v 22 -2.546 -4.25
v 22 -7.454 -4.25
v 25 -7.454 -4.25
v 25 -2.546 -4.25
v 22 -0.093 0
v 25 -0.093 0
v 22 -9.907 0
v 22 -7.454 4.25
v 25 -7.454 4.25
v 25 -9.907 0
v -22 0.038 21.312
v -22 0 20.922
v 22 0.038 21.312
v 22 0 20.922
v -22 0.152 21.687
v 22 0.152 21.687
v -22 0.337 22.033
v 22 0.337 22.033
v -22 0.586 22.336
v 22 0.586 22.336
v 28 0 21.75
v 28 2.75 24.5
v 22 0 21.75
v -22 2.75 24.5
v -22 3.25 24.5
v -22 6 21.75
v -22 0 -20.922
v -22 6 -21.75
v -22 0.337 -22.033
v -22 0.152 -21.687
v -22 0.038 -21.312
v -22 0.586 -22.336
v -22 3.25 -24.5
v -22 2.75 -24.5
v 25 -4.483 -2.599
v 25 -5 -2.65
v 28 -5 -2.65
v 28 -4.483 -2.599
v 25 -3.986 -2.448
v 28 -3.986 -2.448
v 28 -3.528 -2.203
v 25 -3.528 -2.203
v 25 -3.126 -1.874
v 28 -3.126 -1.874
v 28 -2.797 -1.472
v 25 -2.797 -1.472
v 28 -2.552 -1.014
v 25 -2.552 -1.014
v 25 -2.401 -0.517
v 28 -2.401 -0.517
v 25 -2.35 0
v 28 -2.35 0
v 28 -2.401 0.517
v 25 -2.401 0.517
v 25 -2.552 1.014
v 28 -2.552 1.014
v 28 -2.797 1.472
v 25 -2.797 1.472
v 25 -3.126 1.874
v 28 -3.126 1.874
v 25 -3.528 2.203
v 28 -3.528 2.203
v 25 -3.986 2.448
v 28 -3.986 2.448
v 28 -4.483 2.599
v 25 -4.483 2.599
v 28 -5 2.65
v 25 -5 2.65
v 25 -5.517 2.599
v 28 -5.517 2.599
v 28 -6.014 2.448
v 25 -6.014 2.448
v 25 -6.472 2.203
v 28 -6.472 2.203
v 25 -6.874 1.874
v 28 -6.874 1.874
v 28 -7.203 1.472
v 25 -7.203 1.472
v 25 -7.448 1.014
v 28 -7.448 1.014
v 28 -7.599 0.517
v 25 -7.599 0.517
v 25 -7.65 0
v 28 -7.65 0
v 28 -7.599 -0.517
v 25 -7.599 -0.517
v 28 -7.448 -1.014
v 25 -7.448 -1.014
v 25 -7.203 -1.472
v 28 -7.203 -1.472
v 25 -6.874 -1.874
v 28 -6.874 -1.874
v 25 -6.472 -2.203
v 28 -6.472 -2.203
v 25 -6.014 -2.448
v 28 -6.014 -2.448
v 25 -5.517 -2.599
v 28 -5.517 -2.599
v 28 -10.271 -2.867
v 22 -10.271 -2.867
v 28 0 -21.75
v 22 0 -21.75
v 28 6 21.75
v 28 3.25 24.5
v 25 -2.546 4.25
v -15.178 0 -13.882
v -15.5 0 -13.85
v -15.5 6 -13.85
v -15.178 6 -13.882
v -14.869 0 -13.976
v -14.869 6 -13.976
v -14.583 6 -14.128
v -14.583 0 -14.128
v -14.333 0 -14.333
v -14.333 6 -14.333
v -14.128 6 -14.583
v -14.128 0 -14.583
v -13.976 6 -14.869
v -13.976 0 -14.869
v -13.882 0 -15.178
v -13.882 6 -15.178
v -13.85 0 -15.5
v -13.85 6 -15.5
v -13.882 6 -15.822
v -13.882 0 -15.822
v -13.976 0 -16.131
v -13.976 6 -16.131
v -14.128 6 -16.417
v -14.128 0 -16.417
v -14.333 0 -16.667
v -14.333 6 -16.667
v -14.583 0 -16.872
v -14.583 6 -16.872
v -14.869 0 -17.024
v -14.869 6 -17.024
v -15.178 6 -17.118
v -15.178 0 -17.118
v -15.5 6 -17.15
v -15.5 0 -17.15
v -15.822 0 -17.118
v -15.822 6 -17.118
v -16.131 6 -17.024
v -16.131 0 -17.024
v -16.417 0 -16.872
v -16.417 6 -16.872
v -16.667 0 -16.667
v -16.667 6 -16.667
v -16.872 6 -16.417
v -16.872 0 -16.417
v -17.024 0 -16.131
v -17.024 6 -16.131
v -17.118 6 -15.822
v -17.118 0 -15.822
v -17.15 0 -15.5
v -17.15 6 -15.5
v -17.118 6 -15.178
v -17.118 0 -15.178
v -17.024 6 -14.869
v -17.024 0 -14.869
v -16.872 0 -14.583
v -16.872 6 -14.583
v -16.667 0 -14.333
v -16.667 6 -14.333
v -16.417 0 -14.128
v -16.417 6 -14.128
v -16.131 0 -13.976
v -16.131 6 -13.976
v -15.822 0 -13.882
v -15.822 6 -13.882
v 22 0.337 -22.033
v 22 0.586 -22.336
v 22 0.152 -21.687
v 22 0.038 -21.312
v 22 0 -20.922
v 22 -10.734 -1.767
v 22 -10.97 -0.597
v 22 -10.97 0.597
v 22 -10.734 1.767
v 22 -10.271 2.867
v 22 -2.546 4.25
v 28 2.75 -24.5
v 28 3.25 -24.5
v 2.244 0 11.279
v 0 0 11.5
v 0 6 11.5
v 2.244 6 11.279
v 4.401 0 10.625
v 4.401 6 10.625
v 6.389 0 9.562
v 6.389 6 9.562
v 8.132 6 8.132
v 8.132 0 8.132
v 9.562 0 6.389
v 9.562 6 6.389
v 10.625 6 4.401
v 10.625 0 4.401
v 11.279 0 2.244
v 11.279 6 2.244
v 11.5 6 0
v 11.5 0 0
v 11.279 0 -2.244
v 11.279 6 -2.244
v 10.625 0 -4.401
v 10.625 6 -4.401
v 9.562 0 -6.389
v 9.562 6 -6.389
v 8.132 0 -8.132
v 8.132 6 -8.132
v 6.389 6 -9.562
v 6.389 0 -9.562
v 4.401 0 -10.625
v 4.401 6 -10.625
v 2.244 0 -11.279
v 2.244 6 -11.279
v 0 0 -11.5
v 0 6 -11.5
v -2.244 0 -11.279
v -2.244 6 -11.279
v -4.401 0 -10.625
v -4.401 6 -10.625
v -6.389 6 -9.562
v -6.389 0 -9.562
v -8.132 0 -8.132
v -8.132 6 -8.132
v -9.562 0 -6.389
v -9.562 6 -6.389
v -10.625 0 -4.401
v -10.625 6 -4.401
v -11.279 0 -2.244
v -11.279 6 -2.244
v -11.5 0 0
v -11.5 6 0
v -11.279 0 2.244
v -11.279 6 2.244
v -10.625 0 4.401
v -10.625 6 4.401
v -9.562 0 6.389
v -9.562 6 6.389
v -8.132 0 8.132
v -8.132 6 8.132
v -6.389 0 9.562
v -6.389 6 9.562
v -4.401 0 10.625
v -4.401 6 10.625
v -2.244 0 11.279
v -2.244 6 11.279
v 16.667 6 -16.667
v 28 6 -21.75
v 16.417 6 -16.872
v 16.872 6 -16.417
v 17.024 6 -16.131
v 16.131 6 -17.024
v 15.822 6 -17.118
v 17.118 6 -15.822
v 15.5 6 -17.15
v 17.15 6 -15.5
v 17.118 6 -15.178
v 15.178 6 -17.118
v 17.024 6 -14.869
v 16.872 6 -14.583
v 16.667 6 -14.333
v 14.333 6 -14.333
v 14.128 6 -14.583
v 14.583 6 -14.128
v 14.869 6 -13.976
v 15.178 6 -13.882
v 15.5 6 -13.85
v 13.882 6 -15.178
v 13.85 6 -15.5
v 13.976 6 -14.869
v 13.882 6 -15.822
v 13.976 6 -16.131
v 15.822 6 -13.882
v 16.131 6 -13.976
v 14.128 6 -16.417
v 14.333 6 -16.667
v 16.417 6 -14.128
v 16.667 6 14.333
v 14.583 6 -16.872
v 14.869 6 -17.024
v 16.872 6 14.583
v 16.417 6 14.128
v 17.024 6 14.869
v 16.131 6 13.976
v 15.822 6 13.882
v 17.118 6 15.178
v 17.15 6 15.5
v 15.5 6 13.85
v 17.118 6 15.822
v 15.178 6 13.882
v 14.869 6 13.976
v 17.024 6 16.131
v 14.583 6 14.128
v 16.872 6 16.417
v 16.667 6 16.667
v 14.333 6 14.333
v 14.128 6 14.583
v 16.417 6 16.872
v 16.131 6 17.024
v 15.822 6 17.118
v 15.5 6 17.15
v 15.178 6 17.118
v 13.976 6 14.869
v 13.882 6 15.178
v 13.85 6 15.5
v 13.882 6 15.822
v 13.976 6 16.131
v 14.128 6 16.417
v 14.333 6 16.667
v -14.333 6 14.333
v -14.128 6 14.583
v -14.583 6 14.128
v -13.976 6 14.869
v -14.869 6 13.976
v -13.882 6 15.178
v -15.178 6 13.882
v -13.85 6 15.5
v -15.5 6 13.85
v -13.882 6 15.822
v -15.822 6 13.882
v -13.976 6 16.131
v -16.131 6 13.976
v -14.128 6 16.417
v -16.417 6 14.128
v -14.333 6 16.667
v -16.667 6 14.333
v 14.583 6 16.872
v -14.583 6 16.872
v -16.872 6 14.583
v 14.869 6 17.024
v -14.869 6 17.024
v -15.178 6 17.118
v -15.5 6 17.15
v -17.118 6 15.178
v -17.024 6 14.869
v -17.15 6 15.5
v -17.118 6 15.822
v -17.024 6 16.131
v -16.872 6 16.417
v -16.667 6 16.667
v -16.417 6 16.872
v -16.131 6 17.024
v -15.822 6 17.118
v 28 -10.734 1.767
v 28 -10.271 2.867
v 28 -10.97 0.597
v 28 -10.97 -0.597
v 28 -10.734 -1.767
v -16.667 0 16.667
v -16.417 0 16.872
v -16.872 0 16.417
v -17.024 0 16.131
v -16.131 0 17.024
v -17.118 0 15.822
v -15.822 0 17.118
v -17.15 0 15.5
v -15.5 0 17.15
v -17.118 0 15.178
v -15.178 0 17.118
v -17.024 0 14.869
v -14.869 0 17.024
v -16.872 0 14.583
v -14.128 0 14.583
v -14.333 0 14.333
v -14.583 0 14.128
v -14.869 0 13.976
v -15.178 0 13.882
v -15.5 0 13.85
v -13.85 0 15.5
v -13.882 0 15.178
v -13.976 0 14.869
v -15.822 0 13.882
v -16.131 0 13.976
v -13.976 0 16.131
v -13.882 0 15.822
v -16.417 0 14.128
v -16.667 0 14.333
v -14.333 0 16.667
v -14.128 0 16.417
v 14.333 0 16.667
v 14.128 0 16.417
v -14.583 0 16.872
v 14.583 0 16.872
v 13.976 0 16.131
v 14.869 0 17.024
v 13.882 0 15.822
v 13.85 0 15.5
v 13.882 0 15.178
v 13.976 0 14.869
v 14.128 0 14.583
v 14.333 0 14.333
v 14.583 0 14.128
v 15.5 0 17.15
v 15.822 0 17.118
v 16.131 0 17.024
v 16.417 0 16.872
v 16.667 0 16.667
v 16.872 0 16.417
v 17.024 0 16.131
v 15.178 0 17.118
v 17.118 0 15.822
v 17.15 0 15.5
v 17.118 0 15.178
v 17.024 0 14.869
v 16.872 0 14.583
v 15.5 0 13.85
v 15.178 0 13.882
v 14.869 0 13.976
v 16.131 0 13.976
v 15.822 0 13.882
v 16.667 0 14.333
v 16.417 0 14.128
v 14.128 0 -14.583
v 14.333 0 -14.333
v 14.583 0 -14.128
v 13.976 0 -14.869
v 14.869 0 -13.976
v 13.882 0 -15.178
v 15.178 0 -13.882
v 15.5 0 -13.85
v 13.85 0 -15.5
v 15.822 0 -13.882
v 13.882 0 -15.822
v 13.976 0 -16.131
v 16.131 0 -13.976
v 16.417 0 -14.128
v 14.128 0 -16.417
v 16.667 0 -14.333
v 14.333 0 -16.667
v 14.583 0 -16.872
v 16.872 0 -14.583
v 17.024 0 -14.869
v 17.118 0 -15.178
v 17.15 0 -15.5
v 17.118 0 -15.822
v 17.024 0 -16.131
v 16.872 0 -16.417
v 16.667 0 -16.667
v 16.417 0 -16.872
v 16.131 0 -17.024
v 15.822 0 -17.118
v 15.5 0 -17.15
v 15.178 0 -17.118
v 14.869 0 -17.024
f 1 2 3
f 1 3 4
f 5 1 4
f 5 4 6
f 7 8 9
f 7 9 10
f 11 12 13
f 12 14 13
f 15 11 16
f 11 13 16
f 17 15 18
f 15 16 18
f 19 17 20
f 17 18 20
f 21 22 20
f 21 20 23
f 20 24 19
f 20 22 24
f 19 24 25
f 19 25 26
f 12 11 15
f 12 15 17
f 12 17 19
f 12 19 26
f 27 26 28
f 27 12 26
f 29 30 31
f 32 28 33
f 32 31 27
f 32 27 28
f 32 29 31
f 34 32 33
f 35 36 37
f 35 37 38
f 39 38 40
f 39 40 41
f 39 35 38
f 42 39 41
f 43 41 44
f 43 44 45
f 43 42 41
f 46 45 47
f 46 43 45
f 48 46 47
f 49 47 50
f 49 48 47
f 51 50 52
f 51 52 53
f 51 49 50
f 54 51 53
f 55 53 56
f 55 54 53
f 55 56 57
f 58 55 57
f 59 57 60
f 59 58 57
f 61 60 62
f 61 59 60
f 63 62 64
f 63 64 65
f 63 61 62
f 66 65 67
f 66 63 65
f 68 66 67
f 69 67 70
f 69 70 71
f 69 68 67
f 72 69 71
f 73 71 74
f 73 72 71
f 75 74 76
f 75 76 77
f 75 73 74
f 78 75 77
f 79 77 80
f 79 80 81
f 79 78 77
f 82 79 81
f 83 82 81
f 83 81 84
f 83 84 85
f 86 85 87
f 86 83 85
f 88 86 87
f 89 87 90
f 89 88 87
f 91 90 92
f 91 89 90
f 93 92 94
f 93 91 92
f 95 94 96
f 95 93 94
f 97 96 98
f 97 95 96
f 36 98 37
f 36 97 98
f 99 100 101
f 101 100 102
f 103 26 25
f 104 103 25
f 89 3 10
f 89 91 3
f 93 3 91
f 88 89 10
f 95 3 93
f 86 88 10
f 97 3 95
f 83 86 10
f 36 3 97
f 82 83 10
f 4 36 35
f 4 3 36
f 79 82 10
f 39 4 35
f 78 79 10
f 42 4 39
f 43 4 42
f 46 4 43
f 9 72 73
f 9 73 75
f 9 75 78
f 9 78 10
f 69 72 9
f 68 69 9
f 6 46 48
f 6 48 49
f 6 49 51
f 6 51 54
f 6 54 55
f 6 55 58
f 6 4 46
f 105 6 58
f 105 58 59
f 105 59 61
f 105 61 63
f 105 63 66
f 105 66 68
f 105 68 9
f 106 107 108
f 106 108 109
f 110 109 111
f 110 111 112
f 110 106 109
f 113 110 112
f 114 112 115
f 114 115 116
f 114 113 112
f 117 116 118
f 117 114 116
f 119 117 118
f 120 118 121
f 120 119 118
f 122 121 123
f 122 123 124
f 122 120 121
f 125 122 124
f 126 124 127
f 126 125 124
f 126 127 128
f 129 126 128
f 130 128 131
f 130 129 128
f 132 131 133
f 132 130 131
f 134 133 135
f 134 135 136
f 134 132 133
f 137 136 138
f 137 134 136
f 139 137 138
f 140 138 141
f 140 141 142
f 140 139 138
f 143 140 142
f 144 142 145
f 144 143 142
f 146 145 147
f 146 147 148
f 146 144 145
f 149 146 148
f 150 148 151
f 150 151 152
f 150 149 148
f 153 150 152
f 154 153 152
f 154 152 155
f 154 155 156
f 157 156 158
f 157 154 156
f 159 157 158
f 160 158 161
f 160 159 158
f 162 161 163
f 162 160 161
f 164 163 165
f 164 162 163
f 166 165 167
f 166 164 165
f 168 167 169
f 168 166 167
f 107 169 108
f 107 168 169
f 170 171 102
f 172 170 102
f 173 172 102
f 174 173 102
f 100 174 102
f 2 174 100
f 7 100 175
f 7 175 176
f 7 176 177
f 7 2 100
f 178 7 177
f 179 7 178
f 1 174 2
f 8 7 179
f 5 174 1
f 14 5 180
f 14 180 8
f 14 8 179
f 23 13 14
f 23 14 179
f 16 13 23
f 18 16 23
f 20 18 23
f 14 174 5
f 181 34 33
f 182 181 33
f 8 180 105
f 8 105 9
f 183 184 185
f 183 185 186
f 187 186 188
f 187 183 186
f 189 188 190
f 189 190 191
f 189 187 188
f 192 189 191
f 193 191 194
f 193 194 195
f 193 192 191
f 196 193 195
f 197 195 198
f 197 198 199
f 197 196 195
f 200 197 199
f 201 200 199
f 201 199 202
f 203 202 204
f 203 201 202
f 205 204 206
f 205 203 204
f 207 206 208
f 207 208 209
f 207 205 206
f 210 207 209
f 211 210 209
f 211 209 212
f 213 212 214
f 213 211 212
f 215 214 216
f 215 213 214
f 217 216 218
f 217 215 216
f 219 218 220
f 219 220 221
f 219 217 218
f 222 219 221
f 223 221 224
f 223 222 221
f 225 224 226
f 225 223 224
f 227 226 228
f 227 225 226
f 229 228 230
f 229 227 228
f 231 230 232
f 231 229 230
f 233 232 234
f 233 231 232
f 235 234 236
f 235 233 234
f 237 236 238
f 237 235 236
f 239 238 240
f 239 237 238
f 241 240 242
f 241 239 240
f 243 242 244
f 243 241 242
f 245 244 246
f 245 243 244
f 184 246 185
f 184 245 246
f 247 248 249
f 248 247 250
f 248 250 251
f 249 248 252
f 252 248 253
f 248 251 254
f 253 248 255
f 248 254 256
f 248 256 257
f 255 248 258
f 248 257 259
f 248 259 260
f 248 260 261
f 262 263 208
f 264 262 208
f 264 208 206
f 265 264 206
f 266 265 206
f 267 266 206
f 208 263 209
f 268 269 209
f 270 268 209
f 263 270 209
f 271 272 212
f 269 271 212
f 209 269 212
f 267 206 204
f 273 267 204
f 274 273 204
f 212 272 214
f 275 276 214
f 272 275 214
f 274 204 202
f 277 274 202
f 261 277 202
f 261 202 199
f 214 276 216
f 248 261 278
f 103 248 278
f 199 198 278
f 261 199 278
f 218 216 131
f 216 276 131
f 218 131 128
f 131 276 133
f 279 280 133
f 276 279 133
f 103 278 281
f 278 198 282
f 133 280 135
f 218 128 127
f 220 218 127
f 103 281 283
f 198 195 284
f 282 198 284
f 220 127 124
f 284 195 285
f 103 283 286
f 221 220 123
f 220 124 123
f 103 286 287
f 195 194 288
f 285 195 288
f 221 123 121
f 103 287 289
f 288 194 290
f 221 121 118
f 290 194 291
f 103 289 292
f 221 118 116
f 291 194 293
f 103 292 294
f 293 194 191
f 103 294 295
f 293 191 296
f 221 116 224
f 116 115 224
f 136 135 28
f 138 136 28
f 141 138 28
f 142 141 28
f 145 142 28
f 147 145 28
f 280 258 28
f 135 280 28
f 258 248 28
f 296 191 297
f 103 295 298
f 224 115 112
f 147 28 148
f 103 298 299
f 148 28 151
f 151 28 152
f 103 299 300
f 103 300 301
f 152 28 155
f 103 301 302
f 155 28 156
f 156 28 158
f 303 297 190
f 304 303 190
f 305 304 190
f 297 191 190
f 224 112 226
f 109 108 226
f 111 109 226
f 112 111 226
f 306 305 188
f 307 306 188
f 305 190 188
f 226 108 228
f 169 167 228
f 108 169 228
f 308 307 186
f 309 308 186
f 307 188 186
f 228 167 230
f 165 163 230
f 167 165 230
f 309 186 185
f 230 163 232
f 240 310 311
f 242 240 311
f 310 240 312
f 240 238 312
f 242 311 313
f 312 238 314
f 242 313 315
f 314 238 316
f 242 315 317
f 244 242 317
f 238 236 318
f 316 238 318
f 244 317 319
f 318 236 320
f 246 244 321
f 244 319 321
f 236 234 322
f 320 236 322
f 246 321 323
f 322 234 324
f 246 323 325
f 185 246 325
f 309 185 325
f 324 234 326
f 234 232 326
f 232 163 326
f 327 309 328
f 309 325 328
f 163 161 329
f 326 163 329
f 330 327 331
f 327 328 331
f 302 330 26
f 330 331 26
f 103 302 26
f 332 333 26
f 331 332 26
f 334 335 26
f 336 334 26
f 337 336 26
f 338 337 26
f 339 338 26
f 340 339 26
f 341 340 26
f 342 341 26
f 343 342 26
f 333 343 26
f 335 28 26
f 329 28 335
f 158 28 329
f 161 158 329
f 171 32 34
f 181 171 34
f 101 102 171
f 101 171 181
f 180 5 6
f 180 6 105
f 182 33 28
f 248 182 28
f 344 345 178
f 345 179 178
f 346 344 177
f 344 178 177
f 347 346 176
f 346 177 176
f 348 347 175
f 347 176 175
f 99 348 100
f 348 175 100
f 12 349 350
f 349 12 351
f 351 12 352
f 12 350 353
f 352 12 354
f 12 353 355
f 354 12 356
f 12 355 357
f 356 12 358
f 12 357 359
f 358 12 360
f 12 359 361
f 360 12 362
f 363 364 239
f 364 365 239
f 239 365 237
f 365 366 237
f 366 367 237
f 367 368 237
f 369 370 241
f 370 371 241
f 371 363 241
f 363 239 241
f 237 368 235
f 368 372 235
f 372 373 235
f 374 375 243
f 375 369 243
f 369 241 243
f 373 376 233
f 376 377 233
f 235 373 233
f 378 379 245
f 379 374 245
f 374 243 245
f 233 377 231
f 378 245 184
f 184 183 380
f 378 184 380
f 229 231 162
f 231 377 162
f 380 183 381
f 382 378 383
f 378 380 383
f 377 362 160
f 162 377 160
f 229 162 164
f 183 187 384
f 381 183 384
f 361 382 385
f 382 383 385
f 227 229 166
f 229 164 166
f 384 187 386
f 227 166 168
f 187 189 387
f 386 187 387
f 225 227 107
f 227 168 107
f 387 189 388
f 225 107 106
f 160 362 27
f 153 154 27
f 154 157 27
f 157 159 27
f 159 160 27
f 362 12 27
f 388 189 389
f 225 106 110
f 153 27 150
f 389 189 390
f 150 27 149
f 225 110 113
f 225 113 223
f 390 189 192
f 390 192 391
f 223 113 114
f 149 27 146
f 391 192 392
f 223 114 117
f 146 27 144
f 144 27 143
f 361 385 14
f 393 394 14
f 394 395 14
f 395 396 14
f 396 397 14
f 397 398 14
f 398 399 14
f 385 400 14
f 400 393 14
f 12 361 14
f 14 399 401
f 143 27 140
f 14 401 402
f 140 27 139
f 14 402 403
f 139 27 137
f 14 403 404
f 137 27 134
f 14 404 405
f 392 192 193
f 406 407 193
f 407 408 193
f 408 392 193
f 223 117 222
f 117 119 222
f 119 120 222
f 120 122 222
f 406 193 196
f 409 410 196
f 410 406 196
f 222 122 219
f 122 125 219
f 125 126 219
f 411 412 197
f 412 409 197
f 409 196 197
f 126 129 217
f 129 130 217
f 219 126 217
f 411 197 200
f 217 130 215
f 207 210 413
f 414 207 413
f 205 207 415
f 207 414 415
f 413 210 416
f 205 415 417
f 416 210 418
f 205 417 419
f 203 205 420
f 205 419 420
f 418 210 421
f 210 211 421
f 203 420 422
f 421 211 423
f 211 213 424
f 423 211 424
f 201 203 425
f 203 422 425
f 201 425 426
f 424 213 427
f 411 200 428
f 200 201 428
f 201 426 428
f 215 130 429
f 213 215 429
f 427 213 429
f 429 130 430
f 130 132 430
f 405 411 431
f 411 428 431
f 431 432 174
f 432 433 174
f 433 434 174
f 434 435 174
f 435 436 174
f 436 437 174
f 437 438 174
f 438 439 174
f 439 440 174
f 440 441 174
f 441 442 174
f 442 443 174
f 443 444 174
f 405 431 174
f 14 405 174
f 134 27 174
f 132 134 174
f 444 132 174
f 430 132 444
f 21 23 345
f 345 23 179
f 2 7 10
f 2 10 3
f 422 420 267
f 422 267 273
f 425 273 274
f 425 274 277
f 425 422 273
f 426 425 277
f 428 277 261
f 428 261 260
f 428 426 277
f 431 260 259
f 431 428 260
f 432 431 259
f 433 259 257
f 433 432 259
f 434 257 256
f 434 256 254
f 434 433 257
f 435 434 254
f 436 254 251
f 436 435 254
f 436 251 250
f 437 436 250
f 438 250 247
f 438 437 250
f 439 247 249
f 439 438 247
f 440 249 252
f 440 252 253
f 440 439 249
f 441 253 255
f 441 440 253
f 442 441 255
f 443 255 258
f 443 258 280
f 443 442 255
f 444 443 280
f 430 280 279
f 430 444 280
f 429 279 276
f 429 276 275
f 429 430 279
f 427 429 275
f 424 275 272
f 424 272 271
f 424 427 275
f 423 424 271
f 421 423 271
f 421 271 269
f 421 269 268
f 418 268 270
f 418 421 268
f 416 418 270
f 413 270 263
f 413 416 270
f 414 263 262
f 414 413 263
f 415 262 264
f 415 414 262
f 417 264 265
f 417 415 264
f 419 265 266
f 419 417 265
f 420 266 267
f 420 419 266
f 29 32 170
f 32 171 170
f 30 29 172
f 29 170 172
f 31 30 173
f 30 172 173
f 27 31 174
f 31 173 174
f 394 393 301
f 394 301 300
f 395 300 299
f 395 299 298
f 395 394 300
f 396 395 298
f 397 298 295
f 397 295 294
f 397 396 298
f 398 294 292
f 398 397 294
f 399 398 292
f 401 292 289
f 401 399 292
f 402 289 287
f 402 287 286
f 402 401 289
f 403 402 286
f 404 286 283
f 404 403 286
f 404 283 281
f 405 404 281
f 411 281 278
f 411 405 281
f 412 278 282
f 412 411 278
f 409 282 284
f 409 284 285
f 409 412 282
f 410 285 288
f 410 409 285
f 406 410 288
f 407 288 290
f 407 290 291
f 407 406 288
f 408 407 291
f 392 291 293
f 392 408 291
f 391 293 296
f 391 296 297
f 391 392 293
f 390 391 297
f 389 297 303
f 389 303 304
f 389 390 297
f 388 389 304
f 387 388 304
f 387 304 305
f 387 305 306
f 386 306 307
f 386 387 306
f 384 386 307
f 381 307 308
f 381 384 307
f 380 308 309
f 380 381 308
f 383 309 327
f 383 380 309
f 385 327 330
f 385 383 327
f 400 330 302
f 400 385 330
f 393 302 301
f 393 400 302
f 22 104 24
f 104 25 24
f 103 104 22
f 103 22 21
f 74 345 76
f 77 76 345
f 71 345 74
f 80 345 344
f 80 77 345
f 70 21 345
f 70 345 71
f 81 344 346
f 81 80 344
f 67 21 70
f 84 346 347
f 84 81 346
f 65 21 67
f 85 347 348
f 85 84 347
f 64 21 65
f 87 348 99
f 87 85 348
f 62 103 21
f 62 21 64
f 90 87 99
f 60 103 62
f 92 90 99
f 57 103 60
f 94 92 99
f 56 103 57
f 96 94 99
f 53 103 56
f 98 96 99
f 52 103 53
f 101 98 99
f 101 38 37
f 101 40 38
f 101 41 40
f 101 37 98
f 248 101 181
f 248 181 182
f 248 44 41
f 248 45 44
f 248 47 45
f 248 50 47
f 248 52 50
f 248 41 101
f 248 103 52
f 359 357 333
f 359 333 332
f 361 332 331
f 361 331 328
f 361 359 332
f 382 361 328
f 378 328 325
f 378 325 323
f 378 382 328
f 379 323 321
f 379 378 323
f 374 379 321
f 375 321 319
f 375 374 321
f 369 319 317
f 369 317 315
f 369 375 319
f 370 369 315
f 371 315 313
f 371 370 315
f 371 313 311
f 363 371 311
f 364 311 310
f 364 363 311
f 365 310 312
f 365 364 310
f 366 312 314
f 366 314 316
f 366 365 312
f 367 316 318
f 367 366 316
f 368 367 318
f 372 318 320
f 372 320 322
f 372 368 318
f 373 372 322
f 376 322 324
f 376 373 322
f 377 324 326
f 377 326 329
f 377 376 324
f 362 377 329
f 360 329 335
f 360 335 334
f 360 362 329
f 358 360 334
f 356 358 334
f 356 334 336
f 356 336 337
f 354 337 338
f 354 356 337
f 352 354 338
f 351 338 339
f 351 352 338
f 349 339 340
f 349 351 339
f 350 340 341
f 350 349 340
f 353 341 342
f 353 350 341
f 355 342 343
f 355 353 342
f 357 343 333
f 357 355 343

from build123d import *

# Parameters (mm, degrees)
SKETCH1_W           = 44
SKETCH1_H           = 49
SKETCH1_R           = 11.5
SKETCH1_R_2         = 1.65
BOSS_EXTRUDE1_DEPTH = 6
CHAMFER1_SIZE       = 2.75
BOSS_EXTRUDE2_DEPTH = 3
SKETCH3_R           = 2.65
BOSS_EXTRUDE3_DEPTH = 3
BOSS_EXTRUDE4_DEPTH = 6
FILLET1_R           = 2


with BuildPart() as part:
    # Sketch1 → Boss-Extrude1 (new body)
    with BuildSketch(Plane(origin=(0, 0, 0), x_dir=(1, 0, 0), z_dir=(0, 1, 0))):
        Rectangle(SKETCH1_W, SKETCH1_H)
        with Locations(Location((0, 0, 0), (0, 0, 270))):
            Circle(SKETCH1_R, mode=Mode.SUBTRACT)
        with Locations(Location((15.5, 15.5, 0), (0, 0, 270))):
            Circle(SKETCH1_R_2, mode=Mode.SUBTRACT)
        with Locations(Location((15.5, -15.5, 0), (0, 0, 270))):
            Circle(SKETCH1_R_2, mode=Mode.SUBTRACT)
        with Locations(Location((-15.5, -15.5, 0), (0, 0, 270))):
            Circle(SKETCH1_R_2, mode=Mode.SUBTRACT)
        with Locations(Location((-15.5, 15.5, 0), (0, 0, 270))):
            Circle(SKETCH1_R_2, mode=Mode.SUBTRACT)
    extrude(amount=BOSS_EXTRUDE1_DEPTH)

    # Chamfer1
    chamfer1_edges = [part.edges().sort_by_distance(p)[0] for p in [
        (0, 6, 24.5),
        (0, 0, 24.5),
        (0, 0, -24.5),
        (0, 6, -24.5),
    ]]
    chamfer(chamfer1_edges, length=CHAMFER1_SIZE)

    # Sketch2 → Boss-Extrude2 (add)
    with BuildSketch(Plane(origin=(22, 0, 0), x_dir=(0, 0, -1), z_dir=(1, 0, 0))):
        with BuildLine():
            Line((-21.75, 6), (21.75, 6))
            Line((21.75, 6), (21.75, 0))
            Line((21.75, 0), (2.866847379, -10.270786099))
            ThreePointArc((2.866847379, -10.270786099), (0, -11), (-2.866847379, -10.270786099))
            Line((-2.866847379, -10.270786099), (-21.75, 0))
            Line((-21.75, 0), (-21.75, 6))
        make_face()
        Polygon((0, -9.907477288), (4.25, -7.453738644), (4.25, -2.546261356), (0, -0.092522712), (-4.25, -2.546261356), (-4.25, -7.453738644), align=None, mode=Mode.SUBTRACT)
    extrude(amount=BOSS_EXTRUDE2_DEPTH)

    # Sketch3 → Boss-Extrude3 (add)
    # profile 1 of 2: a face of its own
    with BuildSketch(Plane(origin=(25, 0, 0), x_dir=(0, 0, -1), z_dir=(1, 0, 0))):
        with BuildLine():
            Line((21.75, 6), (-21.75, 6))
            Line((-21.75, 6), (-21.75, 0))
            Line((-21.75, 0), (-2.866847379, -10.270786099))
            ThreePointArc((-2.866847379, -10.270786099), (0, -11), (2.866847379, -10.270786099))
            Line((2.866847379, -10.270786099), (21.75, 0))
            Line((21.75, 0), (21.75, 6))
        make_face()
        Polygon((4.25, -2.546261356), (4.25, -7.453738644), (0, -9.907477288), (-4.25, -7.453738644), (-4.25, -2.546261356), (0, -0.092522712), align=None, mode=Mode.SUBTRACT)
    # profile 2 of 2: a face of its own
    with BuildSketch(Plane(origin=(25, 0, 0), x_dir=(0, 0, -1), z_dir=(1, 0, 0))):
        Polygon((4.25, -7.453738644), (0, -9.907477288), (-4.25, -7.453738644), (-4.25, -2.546261356), (0, -0.092522712), (4.25, -2.546261356), align=None)
        with Locations((0, -5)):
            Circle(SKETCH3_R, mode=Mode.SUBTRACT)
    extrude(amount=BOSS_EXTRUDE3_DEPTH)

    # Sketch4 → Boss-Extrude4 (add)
    with BuildSketch(Plane(origin=(22, 0, 0), x_dir=(0, 0, -1), z_dir=(1, 0, 0))):
        Polygon((-21.75, 0), (-21.75, 6), (-24.5, 3.25), (-24.5, 2.75), align=None)
        Polygon((21.75, 6), (21.75, 0), (24.5, 2.75), (24.5, 3.25), align=None)
    extrude(amount=BOSS_EXTRUDE4_DEPTH)

    # Fillet1
    fillet1_edges = [part.edges().sort_by_distance(p)[0] for p in [
        (0, 0, 21.75),
        (0, 0, -21.75),
    ]]
    fillet(fillet1_edges, radius=FILLET1_R)


solid = part.part
